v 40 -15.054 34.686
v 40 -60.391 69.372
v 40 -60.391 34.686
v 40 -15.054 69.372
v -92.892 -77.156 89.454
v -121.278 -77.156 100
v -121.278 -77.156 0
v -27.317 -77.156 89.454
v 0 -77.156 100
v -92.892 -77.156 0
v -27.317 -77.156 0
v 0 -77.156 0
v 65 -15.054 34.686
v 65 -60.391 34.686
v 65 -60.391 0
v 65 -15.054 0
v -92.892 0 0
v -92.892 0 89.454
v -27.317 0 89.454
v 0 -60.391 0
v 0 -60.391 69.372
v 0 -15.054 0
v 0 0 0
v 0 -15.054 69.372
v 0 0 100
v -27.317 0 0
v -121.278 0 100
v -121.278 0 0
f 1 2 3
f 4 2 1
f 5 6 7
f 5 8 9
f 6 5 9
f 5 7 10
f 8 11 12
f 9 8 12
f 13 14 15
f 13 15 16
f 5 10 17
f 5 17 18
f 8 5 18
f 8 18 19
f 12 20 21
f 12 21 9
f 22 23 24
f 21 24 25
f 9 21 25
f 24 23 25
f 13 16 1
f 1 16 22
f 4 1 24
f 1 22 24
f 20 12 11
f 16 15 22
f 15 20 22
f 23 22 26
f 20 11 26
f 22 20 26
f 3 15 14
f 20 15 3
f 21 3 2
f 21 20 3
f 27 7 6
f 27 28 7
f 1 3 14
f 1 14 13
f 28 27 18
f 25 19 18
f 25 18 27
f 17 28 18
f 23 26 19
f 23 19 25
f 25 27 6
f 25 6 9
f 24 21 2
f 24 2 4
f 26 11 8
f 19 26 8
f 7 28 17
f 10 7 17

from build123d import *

# Parameters (mm, degrees)
F0_W      = 121.2779134512
F0_H      = 37.155687809
F1_DEPTH  = 100
F2_DEPTH  = 25
F3_DEPTH  = 15
F4_W      = 65.5741617084
F4_H      = 89.4537195563
F5_DEPTH  = 1200
F7_W      = 45.3369794413
F7_H      = 69.372177124
F8_DEPTH  = 40
F9_W      = 45.3369794413
F9_H      = 34.686088562
F10_DEPTH = 25


with BuildPart() as f1:
    # F0 (on Top) → F1 (new body)
    with BuildSketch(Plane.XY):
        with Locations((-60.6389567256, -18.5778439045)):
            Rectangle(F0_W, F0_H)
    extrude(amount=F1_DEPTH)

    # F2 (add): a face of the model
    f2_faces = [f1.faces().sort_by_distance(p)[0] for p in [
        (-60.6389567256, -37.155687809, 50),
    ]]
    extrude(f2_faces, amount=F2_DEPTH)

    # F3 (add): a face of the model
    f3_faces = [f1.faces().sort_by_distance(p)[0] for p in [
        (-60.6389567256, -62.155687809, 50),
    ]]
    extrude(f3_faces, amount=F3_DEPTH)

    # F4 (on face) → F5 (cut)
    with BuildSketch(Plane.XZ.offset(77.155687809)):
        with Locations((-60.1045750082, 44.7268597782)):
            Rectangle(F4_W, F4_H)
    extrude(amount=-F5_DEPTH, mode=Mode.SUBTRACT)

    # F7 (on face) → F8 (join)
    with BuildSketch(Plane.YZ):
        with Locations((-37.7225787379, 34.686088562)):
            Rectangle(F7_W, F7_H)
    extrude(amount=F8_DEPTH)

    # F9 (on face) → F10 (join)
    with BuildSketch(Plane.YZ.offset(40)):
        with Locations((-37.7225787379, 17.343044281)):
            Rectangle(F9_W, F9_H)
    extrude(amount=F10_DEPTH)


solid = f1.part
